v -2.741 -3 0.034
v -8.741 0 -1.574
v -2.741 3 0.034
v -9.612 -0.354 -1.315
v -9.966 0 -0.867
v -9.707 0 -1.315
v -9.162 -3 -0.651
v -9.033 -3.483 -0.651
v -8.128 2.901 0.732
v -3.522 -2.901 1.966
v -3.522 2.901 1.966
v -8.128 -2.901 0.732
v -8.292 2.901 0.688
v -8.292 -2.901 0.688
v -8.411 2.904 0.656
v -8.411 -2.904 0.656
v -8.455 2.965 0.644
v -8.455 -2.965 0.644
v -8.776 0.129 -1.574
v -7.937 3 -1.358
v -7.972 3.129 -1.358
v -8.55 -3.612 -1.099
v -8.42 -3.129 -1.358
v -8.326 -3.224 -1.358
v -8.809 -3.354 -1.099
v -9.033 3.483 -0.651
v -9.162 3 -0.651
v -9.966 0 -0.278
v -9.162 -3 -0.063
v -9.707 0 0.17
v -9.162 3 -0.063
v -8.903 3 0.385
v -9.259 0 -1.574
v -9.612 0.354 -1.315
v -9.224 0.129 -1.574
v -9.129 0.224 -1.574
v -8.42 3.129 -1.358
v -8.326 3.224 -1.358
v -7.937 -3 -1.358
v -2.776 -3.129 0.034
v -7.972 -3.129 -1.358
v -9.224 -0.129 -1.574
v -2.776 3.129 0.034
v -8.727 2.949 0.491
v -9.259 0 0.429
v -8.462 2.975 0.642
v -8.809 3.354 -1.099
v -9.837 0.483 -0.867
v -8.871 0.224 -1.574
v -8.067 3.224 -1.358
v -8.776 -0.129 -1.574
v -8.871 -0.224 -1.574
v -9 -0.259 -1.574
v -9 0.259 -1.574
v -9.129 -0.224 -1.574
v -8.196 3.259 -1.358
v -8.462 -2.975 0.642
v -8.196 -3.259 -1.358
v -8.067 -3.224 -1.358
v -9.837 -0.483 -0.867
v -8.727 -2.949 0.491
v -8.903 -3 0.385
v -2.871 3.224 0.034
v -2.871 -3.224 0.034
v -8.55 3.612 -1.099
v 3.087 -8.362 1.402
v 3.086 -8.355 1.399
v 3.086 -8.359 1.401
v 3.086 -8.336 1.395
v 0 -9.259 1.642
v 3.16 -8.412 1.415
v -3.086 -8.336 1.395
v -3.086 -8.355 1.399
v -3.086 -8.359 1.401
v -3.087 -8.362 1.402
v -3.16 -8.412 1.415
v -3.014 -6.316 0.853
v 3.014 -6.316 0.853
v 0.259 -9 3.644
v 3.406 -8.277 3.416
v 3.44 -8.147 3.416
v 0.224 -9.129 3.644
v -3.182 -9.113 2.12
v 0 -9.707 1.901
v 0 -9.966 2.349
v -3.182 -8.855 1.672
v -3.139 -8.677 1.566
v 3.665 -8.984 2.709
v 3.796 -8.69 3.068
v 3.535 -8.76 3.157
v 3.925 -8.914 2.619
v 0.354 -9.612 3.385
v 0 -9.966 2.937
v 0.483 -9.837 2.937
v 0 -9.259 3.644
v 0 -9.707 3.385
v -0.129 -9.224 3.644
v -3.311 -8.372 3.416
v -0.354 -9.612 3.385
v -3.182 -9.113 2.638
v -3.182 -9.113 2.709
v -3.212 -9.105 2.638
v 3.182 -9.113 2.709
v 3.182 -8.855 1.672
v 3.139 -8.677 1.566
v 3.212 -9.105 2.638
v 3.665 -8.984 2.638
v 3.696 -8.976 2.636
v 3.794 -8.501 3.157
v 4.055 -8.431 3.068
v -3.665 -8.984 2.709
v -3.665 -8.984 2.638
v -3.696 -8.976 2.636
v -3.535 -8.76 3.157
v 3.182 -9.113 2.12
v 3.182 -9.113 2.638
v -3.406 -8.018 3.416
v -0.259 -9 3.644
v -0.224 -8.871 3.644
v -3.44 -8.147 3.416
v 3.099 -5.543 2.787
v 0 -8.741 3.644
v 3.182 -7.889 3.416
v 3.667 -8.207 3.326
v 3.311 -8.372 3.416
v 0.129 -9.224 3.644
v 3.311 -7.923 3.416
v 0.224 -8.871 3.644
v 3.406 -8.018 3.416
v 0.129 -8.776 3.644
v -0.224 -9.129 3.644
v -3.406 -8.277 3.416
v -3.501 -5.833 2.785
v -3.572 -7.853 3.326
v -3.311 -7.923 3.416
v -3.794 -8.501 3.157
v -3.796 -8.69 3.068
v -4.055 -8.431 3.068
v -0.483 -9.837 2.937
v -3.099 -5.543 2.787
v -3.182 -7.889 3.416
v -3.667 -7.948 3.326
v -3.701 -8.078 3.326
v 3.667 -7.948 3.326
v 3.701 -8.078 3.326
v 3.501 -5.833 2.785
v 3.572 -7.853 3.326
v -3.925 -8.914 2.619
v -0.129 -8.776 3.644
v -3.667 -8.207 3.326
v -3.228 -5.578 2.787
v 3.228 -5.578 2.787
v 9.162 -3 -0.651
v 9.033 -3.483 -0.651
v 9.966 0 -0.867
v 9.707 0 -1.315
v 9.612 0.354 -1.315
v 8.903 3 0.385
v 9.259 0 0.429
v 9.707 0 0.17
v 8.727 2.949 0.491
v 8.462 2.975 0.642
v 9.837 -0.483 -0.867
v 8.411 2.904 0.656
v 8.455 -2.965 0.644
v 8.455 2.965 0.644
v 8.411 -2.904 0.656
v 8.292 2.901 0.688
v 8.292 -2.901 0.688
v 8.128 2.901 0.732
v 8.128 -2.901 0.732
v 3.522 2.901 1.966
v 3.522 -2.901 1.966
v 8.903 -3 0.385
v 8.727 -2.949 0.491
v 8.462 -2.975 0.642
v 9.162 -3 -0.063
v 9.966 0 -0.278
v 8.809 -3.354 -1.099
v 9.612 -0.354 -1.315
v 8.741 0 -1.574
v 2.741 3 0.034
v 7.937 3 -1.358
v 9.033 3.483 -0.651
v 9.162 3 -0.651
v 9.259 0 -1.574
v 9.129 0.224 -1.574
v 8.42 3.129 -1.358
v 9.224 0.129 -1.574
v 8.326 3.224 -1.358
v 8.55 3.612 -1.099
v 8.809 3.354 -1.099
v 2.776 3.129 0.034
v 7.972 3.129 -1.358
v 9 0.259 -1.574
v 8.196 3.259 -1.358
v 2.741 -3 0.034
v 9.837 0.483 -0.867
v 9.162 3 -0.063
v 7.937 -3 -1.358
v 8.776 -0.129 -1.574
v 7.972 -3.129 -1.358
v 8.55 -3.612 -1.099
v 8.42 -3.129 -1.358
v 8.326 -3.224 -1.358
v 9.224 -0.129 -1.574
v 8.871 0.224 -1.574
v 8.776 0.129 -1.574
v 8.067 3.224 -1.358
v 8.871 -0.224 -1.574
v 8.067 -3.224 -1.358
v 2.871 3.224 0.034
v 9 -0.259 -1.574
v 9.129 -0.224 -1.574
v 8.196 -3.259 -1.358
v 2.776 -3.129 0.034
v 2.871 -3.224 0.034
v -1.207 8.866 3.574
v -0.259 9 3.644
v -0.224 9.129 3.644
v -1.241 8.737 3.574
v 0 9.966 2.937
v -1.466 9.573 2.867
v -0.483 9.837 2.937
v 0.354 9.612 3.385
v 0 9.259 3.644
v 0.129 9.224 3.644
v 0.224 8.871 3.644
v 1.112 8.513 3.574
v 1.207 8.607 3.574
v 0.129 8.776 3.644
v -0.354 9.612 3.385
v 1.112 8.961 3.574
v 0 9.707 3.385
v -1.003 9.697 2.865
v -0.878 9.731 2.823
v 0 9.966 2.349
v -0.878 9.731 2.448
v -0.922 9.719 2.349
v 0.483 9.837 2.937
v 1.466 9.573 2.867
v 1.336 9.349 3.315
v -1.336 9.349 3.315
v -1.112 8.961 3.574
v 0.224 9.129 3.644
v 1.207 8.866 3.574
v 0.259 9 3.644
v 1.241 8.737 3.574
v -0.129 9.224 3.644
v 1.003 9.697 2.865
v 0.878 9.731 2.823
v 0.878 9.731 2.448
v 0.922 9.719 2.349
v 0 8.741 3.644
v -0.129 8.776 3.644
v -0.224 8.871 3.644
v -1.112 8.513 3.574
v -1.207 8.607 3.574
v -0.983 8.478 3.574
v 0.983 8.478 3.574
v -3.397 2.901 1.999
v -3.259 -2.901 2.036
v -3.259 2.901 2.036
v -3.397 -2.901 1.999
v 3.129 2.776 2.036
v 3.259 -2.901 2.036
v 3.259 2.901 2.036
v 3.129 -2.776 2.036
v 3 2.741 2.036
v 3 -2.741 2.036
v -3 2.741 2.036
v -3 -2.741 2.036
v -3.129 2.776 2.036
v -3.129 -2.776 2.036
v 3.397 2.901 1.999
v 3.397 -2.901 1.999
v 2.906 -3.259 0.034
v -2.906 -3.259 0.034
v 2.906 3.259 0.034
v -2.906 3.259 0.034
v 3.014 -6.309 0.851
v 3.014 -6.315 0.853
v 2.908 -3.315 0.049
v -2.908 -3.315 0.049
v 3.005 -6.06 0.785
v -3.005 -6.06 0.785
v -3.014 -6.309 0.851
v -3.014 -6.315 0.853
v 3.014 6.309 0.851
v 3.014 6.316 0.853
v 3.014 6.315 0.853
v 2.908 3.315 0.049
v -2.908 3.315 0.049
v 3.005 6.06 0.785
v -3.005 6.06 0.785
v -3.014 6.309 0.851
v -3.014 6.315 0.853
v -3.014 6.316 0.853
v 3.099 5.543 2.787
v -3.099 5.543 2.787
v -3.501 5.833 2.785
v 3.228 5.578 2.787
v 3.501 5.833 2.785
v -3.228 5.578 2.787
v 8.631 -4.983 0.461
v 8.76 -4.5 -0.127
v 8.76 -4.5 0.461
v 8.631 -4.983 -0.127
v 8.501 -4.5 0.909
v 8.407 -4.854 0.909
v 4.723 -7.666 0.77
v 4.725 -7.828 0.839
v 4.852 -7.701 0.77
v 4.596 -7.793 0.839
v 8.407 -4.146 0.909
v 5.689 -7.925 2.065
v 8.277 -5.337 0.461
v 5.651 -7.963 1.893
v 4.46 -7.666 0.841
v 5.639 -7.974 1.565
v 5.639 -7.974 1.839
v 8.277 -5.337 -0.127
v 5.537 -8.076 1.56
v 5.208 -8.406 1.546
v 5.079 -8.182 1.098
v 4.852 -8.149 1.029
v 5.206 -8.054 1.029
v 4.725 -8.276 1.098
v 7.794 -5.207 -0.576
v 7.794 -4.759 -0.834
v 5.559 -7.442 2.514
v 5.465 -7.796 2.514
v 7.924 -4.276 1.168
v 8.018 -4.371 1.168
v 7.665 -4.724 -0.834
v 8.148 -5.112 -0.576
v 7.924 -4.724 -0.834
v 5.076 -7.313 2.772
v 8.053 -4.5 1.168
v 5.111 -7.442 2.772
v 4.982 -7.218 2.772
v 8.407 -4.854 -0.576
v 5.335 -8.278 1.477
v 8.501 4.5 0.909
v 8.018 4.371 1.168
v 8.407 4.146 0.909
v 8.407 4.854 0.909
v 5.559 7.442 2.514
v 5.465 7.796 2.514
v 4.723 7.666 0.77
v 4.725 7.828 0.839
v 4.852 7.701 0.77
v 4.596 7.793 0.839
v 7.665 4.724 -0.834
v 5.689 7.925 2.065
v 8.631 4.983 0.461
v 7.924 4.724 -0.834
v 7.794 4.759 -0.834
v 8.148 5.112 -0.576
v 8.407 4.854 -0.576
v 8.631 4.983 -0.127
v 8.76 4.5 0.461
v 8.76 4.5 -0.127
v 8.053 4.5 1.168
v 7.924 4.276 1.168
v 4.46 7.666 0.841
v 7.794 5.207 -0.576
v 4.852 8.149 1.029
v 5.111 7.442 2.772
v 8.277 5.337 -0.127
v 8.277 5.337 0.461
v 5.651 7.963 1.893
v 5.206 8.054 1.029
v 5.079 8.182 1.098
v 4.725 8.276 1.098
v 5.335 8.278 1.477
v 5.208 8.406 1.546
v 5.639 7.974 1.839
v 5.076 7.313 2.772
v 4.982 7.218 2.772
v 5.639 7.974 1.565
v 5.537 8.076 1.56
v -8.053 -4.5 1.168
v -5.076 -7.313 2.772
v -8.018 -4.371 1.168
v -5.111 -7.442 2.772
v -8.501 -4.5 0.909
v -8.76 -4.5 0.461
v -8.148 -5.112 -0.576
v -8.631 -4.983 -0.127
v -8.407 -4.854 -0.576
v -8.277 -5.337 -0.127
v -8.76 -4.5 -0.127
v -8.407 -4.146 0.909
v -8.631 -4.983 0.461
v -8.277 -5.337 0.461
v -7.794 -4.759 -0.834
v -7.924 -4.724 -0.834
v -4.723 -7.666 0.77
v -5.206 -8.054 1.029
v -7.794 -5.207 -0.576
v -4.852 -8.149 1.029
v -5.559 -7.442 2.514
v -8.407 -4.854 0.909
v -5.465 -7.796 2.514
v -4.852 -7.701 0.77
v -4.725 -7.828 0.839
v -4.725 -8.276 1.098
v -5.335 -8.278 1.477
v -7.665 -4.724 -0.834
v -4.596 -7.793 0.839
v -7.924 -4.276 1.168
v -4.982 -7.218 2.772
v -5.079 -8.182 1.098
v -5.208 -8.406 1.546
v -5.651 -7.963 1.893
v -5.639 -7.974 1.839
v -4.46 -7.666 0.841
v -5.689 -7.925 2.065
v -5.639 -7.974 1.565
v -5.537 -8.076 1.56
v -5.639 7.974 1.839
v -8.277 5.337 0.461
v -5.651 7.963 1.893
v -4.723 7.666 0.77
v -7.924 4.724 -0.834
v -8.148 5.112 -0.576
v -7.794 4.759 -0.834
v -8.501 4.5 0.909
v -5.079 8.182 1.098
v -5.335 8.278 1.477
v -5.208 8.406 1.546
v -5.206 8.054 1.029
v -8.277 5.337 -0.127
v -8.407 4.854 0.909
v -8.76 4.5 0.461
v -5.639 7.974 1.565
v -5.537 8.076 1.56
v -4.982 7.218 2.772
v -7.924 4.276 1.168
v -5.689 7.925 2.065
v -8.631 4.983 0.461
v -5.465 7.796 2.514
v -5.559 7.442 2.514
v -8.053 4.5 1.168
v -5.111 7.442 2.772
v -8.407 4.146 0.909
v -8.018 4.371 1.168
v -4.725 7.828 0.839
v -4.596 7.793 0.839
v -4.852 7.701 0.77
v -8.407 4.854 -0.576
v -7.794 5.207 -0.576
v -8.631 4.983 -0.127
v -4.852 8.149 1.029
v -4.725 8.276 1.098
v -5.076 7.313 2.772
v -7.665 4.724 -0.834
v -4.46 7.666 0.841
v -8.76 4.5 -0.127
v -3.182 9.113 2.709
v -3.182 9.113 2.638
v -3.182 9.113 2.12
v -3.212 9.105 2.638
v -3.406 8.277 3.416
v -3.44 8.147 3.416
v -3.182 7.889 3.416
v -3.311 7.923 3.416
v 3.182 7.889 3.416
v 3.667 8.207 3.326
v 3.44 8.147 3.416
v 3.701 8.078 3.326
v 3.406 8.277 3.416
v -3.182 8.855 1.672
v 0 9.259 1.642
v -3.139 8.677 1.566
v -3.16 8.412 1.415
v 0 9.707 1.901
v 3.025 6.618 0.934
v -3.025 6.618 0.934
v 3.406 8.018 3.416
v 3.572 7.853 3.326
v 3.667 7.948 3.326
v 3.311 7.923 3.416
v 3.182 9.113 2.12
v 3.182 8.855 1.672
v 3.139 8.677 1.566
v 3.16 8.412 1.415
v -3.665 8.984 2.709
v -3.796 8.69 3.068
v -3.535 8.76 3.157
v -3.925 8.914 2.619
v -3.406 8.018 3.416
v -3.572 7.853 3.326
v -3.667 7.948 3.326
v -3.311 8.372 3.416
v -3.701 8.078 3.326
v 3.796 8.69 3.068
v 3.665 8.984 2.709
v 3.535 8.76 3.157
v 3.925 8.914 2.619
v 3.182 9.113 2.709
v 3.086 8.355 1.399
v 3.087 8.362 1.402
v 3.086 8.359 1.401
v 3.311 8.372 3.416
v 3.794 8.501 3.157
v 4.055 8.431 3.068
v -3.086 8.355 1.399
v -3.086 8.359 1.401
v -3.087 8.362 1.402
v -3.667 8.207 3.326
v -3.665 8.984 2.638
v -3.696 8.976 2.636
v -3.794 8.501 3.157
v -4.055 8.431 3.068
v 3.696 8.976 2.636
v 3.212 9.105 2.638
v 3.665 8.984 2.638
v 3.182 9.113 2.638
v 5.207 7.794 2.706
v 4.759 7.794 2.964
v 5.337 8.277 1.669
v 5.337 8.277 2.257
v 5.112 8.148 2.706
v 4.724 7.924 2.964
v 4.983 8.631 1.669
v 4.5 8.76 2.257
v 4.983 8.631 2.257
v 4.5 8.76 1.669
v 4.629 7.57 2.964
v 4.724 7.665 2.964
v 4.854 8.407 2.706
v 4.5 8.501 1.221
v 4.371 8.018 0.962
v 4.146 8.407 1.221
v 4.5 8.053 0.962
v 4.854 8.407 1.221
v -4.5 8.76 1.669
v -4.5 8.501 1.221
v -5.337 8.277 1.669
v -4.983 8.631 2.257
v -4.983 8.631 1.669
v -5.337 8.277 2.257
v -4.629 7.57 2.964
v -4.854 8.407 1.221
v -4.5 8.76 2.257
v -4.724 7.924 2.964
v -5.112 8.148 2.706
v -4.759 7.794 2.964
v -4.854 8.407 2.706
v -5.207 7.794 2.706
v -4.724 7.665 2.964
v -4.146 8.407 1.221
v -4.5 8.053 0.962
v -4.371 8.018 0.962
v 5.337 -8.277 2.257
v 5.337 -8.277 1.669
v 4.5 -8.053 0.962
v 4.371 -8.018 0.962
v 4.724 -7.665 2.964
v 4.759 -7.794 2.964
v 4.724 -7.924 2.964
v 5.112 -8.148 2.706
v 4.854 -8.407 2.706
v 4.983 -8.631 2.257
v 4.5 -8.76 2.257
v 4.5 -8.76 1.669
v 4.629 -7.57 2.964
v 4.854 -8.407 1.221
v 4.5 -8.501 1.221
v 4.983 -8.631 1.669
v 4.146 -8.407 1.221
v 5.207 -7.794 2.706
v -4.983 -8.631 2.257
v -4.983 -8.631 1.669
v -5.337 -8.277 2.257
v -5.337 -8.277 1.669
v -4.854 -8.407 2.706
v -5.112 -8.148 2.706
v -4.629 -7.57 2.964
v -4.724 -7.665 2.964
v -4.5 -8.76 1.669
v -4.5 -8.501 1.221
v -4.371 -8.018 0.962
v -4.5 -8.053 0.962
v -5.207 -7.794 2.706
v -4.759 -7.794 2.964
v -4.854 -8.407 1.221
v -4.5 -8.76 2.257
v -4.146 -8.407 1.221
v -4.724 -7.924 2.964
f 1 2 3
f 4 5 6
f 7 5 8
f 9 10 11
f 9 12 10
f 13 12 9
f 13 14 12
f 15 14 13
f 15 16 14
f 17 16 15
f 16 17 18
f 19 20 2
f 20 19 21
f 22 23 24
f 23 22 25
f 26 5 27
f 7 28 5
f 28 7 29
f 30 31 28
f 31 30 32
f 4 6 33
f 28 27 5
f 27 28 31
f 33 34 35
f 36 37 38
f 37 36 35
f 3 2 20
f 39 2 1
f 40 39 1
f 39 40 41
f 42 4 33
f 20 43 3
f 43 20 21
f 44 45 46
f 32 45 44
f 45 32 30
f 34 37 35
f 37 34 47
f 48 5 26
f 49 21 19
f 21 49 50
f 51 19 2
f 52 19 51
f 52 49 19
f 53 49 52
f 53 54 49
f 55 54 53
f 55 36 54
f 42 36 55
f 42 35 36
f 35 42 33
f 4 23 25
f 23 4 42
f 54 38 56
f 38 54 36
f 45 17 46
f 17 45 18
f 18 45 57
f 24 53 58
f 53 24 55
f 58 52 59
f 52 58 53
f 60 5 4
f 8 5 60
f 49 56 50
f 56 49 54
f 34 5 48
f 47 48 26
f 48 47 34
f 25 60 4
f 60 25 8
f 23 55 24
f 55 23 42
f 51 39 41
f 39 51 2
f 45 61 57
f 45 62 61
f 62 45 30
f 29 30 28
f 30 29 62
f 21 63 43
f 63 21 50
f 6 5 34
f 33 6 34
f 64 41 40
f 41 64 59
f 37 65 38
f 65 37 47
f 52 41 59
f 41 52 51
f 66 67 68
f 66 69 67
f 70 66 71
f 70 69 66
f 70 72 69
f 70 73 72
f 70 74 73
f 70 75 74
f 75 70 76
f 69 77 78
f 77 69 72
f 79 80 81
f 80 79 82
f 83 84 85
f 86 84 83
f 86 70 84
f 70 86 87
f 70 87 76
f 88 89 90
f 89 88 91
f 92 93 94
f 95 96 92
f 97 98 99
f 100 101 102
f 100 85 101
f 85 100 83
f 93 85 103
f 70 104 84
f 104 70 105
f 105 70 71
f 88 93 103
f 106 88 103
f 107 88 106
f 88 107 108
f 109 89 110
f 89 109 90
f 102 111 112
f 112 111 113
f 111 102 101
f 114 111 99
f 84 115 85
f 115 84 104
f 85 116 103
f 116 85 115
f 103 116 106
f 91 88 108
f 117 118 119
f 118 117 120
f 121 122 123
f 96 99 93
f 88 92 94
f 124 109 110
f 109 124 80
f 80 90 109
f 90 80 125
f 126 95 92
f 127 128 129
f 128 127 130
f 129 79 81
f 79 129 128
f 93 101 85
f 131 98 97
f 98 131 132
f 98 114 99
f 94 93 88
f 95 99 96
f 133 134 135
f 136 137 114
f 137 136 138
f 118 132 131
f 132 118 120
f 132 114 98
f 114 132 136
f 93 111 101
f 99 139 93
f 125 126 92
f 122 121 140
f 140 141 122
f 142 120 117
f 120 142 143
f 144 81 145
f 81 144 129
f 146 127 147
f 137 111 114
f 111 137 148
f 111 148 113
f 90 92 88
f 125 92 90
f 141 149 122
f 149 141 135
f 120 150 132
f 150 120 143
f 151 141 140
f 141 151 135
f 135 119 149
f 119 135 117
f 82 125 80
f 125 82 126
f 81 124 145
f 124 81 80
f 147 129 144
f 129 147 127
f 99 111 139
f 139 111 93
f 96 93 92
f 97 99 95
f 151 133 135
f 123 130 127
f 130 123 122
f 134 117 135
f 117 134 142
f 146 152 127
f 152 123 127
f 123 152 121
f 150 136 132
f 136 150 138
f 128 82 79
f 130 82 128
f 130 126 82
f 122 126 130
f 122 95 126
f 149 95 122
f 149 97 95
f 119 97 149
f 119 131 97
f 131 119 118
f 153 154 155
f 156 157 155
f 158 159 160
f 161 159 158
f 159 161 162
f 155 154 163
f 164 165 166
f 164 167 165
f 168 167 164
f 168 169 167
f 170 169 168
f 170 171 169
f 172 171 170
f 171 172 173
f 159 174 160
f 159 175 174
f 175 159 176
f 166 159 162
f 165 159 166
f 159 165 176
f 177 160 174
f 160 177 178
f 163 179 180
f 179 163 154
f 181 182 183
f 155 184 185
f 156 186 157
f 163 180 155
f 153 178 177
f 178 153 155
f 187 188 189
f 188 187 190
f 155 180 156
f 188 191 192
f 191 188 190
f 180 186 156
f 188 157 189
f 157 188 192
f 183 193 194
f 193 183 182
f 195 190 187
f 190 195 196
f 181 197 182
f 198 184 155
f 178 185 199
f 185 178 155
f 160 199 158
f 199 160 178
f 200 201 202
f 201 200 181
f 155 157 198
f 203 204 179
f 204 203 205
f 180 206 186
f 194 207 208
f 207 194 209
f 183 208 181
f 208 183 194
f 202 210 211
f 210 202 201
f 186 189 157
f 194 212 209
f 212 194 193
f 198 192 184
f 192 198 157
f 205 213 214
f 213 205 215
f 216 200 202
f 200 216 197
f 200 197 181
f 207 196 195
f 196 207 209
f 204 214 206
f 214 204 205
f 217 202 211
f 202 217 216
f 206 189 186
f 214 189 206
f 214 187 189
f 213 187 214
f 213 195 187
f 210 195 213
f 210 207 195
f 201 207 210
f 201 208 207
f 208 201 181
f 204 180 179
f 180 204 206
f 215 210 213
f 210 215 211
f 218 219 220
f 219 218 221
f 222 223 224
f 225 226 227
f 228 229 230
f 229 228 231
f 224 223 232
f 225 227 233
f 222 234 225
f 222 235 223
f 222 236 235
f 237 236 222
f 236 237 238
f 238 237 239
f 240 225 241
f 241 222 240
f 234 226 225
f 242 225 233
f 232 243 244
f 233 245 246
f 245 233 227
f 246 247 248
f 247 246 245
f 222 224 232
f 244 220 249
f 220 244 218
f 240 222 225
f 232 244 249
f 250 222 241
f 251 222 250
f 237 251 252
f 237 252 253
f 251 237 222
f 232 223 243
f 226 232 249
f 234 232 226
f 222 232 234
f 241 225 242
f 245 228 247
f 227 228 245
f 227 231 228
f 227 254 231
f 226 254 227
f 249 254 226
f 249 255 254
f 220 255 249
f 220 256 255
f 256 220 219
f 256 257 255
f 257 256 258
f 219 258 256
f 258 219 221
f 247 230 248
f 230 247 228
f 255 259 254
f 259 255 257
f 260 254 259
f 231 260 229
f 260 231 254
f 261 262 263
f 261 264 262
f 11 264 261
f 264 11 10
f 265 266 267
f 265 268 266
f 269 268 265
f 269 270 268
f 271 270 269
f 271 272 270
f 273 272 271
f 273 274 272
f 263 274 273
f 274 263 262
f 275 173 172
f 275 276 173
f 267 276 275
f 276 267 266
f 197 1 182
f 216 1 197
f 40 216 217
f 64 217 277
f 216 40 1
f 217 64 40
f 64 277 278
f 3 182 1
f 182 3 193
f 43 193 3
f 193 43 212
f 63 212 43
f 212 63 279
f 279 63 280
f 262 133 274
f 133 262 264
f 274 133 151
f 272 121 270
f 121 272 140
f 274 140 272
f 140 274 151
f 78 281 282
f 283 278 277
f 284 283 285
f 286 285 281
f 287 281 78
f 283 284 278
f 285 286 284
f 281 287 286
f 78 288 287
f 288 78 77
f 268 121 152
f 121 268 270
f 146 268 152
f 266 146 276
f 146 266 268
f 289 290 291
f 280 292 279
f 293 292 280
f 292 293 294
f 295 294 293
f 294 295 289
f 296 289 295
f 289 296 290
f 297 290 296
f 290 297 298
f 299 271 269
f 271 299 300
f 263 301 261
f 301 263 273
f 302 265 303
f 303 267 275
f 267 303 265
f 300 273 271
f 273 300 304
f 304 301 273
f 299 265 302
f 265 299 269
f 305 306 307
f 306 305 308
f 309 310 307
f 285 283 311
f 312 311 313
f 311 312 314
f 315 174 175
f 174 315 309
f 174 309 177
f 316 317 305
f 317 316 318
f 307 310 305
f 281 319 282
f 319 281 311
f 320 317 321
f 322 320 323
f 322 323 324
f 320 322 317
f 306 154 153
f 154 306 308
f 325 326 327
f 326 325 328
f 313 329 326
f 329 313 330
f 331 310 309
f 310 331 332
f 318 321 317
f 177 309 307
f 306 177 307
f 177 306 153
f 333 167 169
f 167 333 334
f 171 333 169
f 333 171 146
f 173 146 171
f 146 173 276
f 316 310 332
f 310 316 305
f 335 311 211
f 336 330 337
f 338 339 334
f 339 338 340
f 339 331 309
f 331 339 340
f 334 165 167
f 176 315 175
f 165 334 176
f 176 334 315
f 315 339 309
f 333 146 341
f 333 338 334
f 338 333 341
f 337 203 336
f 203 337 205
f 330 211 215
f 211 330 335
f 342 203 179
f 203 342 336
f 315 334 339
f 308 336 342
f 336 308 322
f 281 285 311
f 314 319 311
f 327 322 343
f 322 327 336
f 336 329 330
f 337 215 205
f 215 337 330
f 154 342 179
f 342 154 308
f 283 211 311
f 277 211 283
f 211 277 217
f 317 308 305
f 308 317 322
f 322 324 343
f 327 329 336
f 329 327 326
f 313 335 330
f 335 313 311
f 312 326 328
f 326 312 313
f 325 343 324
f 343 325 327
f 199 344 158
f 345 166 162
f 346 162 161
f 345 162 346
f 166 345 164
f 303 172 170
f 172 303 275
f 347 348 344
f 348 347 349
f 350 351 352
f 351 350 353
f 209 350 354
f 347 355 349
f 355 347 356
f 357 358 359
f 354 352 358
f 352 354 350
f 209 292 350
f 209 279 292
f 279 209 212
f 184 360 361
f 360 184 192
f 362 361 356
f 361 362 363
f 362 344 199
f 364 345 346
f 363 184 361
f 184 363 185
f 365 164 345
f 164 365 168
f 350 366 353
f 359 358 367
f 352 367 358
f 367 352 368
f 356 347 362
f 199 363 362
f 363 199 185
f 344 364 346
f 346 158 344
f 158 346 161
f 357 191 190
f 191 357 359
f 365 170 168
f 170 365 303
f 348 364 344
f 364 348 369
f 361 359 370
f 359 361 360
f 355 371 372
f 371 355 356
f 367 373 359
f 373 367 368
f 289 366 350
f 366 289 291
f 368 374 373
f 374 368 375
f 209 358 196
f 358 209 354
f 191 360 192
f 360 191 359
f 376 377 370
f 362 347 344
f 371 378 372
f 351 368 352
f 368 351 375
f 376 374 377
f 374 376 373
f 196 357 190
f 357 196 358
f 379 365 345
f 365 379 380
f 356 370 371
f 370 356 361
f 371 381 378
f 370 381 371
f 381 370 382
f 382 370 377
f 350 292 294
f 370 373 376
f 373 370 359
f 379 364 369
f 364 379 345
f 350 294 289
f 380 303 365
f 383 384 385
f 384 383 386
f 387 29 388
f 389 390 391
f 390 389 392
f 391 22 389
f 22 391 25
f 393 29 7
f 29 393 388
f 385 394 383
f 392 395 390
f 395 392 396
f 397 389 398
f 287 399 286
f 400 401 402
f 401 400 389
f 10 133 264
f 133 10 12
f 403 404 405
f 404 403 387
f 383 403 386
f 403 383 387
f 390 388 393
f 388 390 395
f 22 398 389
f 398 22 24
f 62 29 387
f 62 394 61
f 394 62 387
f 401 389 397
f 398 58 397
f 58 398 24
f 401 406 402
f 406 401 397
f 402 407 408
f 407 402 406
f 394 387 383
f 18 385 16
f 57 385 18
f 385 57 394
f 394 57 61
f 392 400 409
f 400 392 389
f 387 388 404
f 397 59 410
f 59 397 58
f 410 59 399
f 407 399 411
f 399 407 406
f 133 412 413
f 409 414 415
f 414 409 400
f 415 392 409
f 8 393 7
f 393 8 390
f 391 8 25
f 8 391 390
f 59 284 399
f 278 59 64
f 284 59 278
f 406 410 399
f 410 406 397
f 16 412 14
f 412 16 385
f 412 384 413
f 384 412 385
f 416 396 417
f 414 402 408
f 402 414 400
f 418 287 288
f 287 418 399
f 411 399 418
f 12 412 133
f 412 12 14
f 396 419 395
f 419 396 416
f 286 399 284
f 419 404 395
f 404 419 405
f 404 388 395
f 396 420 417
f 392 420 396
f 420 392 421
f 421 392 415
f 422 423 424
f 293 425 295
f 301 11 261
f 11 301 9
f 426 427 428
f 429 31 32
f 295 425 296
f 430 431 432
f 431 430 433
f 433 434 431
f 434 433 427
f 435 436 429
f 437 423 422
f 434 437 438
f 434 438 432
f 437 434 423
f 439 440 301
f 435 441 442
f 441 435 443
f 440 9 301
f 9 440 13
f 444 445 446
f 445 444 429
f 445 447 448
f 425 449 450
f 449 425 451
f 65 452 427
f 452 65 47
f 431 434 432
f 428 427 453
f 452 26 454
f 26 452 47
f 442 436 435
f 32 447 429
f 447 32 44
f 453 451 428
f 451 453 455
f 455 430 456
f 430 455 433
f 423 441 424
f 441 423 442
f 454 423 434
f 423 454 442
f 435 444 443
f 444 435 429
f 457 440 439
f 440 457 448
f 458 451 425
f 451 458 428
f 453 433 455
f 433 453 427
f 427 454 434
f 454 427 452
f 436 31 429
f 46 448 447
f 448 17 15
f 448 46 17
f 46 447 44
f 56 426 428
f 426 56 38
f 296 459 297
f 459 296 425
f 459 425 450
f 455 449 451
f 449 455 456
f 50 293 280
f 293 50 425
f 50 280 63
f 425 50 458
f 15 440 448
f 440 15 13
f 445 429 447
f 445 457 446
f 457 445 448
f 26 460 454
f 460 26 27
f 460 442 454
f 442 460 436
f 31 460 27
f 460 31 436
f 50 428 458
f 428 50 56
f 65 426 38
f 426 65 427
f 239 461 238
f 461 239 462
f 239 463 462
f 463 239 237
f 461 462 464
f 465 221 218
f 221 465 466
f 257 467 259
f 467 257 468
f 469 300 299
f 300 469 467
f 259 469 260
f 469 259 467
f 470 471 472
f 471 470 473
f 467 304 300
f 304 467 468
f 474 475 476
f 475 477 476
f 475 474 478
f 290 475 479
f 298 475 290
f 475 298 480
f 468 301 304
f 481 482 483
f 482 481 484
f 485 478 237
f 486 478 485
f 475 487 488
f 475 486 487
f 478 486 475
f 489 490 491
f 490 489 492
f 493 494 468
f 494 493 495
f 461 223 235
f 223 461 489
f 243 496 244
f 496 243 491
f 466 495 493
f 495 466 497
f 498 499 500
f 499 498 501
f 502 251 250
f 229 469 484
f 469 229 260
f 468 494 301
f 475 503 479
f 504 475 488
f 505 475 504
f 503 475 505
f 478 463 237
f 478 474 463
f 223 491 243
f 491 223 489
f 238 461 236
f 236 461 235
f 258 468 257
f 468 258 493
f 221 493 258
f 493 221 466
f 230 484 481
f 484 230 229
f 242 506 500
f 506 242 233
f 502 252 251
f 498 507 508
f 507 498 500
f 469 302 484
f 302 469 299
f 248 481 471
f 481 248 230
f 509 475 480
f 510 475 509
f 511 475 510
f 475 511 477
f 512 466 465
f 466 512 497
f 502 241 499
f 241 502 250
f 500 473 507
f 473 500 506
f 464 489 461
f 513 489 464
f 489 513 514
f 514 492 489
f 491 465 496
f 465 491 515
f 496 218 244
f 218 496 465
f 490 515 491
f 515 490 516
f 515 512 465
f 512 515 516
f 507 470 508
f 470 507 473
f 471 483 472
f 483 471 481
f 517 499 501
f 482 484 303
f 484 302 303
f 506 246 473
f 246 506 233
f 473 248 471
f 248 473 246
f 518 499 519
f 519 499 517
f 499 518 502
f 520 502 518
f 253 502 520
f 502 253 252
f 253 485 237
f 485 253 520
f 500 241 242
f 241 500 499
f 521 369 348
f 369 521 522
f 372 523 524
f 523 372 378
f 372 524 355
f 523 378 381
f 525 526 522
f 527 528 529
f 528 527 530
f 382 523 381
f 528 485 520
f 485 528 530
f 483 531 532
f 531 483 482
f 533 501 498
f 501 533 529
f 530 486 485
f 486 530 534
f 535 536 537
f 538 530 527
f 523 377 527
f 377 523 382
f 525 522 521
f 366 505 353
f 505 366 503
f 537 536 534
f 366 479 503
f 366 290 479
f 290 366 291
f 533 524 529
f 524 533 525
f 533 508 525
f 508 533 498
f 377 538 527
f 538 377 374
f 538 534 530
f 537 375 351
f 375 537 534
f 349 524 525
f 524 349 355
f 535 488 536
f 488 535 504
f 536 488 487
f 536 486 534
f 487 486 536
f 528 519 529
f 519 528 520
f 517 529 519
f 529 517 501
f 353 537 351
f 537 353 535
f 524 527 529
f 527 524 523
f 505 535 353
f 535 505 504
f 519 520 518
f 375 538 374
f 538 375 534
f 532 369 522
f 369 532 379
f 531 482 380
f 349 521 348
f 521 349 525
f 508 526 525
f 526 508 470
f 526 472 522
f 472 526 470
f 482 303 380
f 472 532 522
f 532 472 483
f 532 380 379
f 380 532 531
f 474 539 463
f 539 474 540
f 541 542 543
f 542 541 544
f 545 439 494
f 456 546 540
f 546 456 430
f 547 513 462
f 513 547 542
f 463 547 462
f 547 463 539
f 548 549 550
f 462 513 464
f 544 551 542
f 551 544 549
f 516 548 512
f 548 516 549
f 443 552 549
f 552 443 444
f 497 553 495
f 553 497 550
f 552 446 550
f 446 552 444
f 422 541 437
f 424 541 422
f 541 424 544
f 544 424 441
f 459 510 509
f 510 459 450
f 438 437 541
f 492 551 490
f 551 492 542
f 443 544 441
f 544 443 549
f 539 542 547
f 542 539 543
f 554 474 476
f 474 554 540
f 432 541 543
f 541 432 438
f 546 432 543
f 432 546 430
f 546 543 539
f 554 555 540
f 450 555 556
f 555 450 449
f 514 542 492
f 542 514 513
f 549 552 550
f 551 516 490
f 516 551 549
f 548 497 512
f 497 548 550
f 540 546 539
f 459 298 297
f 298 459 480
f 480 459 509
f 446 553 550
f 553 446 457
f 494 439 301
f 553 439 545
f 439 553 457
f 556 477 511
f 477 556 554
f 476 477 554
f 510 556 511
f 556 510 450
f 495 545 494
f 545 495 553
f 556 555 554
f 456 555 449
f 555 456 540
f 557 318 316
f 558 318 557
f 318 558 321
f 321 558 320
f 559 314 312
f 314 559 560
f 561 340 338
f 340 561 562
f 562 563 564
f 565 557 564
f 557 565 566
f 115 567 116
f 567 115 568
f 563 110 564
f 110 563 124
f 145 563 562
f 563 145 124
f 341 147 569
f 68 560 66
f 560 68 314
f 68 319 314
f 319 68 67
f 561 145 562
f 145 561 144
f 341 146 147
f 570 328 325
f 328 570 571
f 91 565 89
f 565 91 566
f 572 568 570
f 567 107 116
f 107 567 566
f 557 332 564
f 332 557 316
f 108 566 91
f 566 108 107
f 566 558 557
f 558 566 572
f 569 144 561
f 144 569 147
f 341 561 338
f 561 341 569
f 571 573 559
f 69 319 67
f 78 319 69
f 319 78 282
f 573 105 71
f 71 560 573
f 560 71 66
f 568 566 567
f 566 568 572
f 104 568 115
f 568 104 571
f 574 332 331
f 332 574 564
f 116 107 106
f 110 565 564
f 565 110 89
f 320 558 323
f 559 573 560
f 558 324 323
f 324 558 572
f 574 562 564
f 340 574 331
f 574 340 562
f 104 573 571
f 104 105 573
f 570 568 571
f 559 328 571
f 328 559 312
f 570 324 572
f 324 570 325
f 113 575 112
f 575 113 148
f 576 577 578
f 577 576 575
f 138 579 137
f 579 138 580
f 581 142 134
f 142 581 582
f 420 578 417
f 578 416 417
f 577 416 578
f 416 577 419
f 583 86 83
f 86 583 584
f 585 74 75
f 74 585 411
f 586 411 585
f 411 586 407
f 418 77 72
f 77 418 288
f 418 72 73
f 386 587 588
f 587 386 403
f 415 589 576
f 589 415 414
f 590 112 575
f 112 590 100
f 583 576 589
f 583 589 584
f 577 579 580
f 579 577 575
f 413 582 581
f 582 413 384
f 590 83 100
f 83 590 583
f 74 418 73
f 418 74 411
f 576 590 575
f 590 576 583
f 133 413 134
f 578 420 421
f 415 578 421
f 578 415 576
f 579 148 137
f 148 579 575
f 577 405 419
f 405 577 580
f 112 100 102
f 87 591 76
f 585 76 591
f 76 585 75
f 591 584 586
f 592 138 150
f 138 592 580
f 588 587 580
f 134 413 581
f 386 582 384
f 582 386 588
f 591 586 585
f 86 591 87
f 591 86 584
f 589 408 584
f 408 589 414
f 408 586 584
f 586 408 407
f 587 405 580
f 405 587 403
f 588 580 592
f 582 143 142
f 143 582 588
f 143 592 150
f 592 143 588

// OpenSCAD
// file: saddle.scad
/*
 *  A subtractive approach to producing a saddle kepcap
 */

include <../settings.scad>;

thumbdeflection = 15;
saddle_sheet = false;

cham_sphere_dia = auto_chamfer() ? minimum_thickness : 0;
thumbthickness = (saddle_sheet ? (minimum_thickness / cos(thumbdeflection)) : minimum_thickness) - cham_sphere_dia;
thumbdia = total_width - cham_sphere_dia;


// subtractive approach to 'carve' a saddle cap

module chamfercutter(arc=360/8, rotation=[0,0,0], center=true){
  //radius = (totalwidth/2)-(thumbthickness/2);

  //if (rotation != [0,0,0]) {
  radius = ((1/cos(rotation.y))*((total_width/2)/*-(thumbthickness/2)*/))-(thumbthickness/2);
  //}

  centering = [rotation.x,0,rotation.z - (arc/2)];
  if (!center) {
    centering = [rotation.x,0,rotation.z];
  }

  /*translate([0,0,tan(rotation.y)*totalwidth/2])*/ rotate(centering) rotate_extrude(angle=arc) {
    rotate([0,0,rotation.y]) translate([radius,0,0]) difference(){
      rotate([0,0,-rotation.y]) square(thumbthickness);
      circle(d=thumbthickness);
    }
  }
}

panel_width = total_width/3;
spacer=tan(thumbdeflection)*panel_width;
offset=panel_width/2;
depth= thumbthickness+(2*spacer);

function height_offset() = minimum_thickness + (saddle_sheet ? 0 : spacer);

module subtractivecap(chamfer=false){
  //translate([0,0,-spacer])
  difference() {
    // workpiece
    cylinder(h=depth,d=total_width);

    //center
    translate([-offset,-offset,spacer+thumbthickness]) cube([panel_width, panel_width,depth]);

    // downslopes
    translate([offset,-offset,spacer+thumbthickness]) rotate([0,thumbdeflection,0])
      translate([-offset, 0,0]) cube([total_width, panel_width,depth]);
    translate([-offset,-offset,spacer+thumbthickness]) mirror([1,0,0]) rotate([0,thumbdeflection,0])
      translate([-offset,0,0]) cube([total_width, panel_width,depth]);

    if (chamfer) {
      translate([0,0,thumbthickness]) chamfercutter(41,[0,-thumbdeflection,0]);
      translate([0,0,thumbthickness]) mirror([1,0,0]) chamfercutter(41, [0,-thumbdeflection,0]);
    }
    // upslopes
    translate([-total_width/2,offset,spacer+thumbthickness]) rotate([thumbdeflection,0,0])  cube([total_width, total_width,depth]);
    translate([-total_width/2,-offset,spacer+thumbthickness]) mirror([0,1,0]) rotate([thumbdeflection,0,0]) cube([total_width, total_width,depth]);

    if (chamfer) {
      translate([0,0,thumbthickness]) chamfercutter(43, [0,thumbdeflection,90]);
      translate([0,0,thumbthickness]) mirror([0,1,0]) chamfercutter(43, [0,thumbdeflection,90]);
    }

    // quarters
    translate([offset, offset,spacer+thumbthickness])
      rotate([thumbdeflection,thumbdeflection,0])
      translate([-offset, 0,0]) cube([total_width, total_width,depth]);
    translate([-offset, offset,spacer+thumbthickness]) mirror([1,0,0])
      rotate([thumbdeflection,thumbdeflection,0])
      translate([-offset, 0,0]) cube([total_width, total_width,depth]);
    translate([offset, -offset,spacer+thumbthickness]) mirror([0,1,0])
      rotate([thumbdeflection,thumbdeflection,0])
      translate([-offset, 0,0]) cube([total_width, total_width,depth]);
    translate([-offset, -offset,spacer+thumbthickness]) rotate([0,0,180])
      rotate([thumbdeflection,thumbdeflection,0])
      translate([-offset, 0,0]) cube([total_width, total_width,depth]);


    //translate([0,0,thumbthickness]) rotate([0,0,-45]) chamfercutter(53, [-thumbdeflection,-thumbdeflection,0]);
    //translate([0,0,thumbthickness]) rotate([0,0,-45-180]) chamfercutter(53, [-thumbdeflection,-thumbdeflection,0]);


    //translate([0,0,thumbthickness]) rotate([0,0,45]) mirror([1,0,0]) chamfercutter(53, [-thumbdeflection,-thumbdeflection,0]);
    //translate([0,0,thumbthickness]) rotate([0,0,45+180]) mirror([1,0,0]) chamfercutter(53, [-thumbdeflection,-thumbdeflection,0]);



    // bottom chamfer
    if (chamfer) {
      translate([0,0,thumbthickness/2]) mirror([0,0,1]) chamfercutter(360);
    }
    //translate([0,0,thumbthickness/2]) chamfercutter(360);

      /*rotate_extrude(angle=360) {
      translate([(totalwidth/2)-(thumbthickness/2),0,0]) difference(){
      square(thumbthickness);
	circle(d=thumbthickness);
      }
      }*/
  }
}

module saddle_sheet() {
  translate([0,0,-spacer]) difference() {
    subtractivecap(false);
    translate([0,0,-thumbthickness]) subtractivecap();
  }
}

module cap() {
  if (auto_chamfer()) {
    minkowski(){
      if (saddle_sheet) {
	saddle_sheet();
      }else{
	subtractivecap(false);
      }
      // sphere is off-center so we don't grow in the -z direction and the cap stays positioned with the bottom on the origin
      translate([0,0,cham_sphere_dia/2]) sphere(d=cham_sphere_dia);
    }
  } else {
      if (saddle_sheet) {
	// XXX: implement manual chamfer?
	saddle_sheet();
      }else{
	subtractivecap(manual_chamfer());
      }
  }
}

cap($fn=12);

//translate([0,0,spacer+thumbthickness]) rotate([0,thumbdeflection,0]) chamfercutter();
//translate([0,0,thumbthickness])  rotate([0,-thumbdeflection,90]) chamfercutter(41);
//translate([0,0,thumbthickness]) rotate([0,-thumbdeflection,90]) chamfercutter(41);
//translate([0,0,thumbthickness]) mirror([0,1,0]) rotate([0,-thumbdeflection,90]) chamfercutter(41);
/*rotate([0,0,-thumbdeflection]) translate([((1/cos(20))*totalwidth/2) -(thumbthickness/2),0,0]) difference(){
    square(thumbthickness);
    circle(d=thumbthickness);
    };*/
//translate([0,0,spacer+thumbthickness]) chamfercutter(41,[0,-thumbdeflection,0]);
//chamfercutter(41,[0,-thumbdeflection,0]);
//radius = ((1/cos(20))*totalwidth/2) -(thumbthickness/2);
/*rotate_extrude(angle=arc) {
     translate([radius-1,0,0]) difference(){
      square(thumbthickness);
      translate([-1,0,0]) rotate([0,0,-20]) translate([1,0,0]) circle(d=thumbthickness);
    }
*/
//rotate([0,0,-20]) translate([1,0,0]) circle(d=thumbthickness);
//translate([0,0,thumbthickness/2]) mirror([0,0,1]) chamfercutter(360);
// file: ../settings.scad
/*
 *   Edit these settings to control the generated keycaps
 */

/* height of the part the finger rests on, doesn't exclude higher protrusions,
       eg. the saddle keycap rises on either side of the thumb for leverage */
effective_height=10;

// maximum width in any direction, strict limit to prevent collision with adjacent keycaps
total_width=18;

// how thick the keycap, excluding the stem should be. mostly aesthetic preference?
minimum_thickness = 2;


keycap_style = "saddle";

/* can be auto (computationally expensive), manual (a bit janky, needs to be implemented for each keycap), or none.
     has no effect on certain keycaps such as trackpoint variants */
chamfer_style = "auto";

/* this allows you to rotate the keycap if the finger approaches at an angle
   you probably only want to rotate the Z-axis (third value) */
keycap_rotation = [0,0,0];

stem_model = "SKQU";



/* -----------------------------------------------------------------------
 *  Do Not Edit - this machinery is consistent regardless of above values
 * -----------------------------------------------------------------------
 */

keycap_file = str("keycaps/",keycap_style,".scad");
//function import_cap() = use <keycap_file>;
/*
module import_stem() {
  if (stem_model == "SKQU") {
    include <SKQU.scad>;
  } else {
    assert(false, "please select a valid stem_model in settings.scad");
  }
  }*/

function auto_chamfer() = chamfer_style == "auto";


function manual_chamfer() = chamfer_style == "manual";
// main file
/*
 *  A saddle with a nearly uniform thickness
 */

include <../settings.scad>;

/*
 * saddle_sheet implementation is coupled to the saddle (specifically the thumbdeflection angle and the spacer
 *   calculated from it) so the impelentation is in saddle.scad and controlled by the saddle_sheet bool.
 *  module cap() is redefined here overriding the other.
 */
include <saddle.scad>;
saddle_sheet = true;

// XXX: why can't I use thumbdeflection from saddle.scad even when I include???
//thumbthickness = (minimum_thickness / cos(15)) - cham_sphere_dia;

/*
module cap() {
  if (auto_chamfer()) {
    minkowski(){
      saddle_sheet();
      // sphere is off-center so we don't grow in the -z direction and the cap stays positioned with the bottom on the origin
      translate([0,0,cham_sphere_dia/2]) sphere(d=cham_sphere_dia);
    }
  }
  }*/

///*translate([total_width+5,0,0])*/ cap($fn=12);
